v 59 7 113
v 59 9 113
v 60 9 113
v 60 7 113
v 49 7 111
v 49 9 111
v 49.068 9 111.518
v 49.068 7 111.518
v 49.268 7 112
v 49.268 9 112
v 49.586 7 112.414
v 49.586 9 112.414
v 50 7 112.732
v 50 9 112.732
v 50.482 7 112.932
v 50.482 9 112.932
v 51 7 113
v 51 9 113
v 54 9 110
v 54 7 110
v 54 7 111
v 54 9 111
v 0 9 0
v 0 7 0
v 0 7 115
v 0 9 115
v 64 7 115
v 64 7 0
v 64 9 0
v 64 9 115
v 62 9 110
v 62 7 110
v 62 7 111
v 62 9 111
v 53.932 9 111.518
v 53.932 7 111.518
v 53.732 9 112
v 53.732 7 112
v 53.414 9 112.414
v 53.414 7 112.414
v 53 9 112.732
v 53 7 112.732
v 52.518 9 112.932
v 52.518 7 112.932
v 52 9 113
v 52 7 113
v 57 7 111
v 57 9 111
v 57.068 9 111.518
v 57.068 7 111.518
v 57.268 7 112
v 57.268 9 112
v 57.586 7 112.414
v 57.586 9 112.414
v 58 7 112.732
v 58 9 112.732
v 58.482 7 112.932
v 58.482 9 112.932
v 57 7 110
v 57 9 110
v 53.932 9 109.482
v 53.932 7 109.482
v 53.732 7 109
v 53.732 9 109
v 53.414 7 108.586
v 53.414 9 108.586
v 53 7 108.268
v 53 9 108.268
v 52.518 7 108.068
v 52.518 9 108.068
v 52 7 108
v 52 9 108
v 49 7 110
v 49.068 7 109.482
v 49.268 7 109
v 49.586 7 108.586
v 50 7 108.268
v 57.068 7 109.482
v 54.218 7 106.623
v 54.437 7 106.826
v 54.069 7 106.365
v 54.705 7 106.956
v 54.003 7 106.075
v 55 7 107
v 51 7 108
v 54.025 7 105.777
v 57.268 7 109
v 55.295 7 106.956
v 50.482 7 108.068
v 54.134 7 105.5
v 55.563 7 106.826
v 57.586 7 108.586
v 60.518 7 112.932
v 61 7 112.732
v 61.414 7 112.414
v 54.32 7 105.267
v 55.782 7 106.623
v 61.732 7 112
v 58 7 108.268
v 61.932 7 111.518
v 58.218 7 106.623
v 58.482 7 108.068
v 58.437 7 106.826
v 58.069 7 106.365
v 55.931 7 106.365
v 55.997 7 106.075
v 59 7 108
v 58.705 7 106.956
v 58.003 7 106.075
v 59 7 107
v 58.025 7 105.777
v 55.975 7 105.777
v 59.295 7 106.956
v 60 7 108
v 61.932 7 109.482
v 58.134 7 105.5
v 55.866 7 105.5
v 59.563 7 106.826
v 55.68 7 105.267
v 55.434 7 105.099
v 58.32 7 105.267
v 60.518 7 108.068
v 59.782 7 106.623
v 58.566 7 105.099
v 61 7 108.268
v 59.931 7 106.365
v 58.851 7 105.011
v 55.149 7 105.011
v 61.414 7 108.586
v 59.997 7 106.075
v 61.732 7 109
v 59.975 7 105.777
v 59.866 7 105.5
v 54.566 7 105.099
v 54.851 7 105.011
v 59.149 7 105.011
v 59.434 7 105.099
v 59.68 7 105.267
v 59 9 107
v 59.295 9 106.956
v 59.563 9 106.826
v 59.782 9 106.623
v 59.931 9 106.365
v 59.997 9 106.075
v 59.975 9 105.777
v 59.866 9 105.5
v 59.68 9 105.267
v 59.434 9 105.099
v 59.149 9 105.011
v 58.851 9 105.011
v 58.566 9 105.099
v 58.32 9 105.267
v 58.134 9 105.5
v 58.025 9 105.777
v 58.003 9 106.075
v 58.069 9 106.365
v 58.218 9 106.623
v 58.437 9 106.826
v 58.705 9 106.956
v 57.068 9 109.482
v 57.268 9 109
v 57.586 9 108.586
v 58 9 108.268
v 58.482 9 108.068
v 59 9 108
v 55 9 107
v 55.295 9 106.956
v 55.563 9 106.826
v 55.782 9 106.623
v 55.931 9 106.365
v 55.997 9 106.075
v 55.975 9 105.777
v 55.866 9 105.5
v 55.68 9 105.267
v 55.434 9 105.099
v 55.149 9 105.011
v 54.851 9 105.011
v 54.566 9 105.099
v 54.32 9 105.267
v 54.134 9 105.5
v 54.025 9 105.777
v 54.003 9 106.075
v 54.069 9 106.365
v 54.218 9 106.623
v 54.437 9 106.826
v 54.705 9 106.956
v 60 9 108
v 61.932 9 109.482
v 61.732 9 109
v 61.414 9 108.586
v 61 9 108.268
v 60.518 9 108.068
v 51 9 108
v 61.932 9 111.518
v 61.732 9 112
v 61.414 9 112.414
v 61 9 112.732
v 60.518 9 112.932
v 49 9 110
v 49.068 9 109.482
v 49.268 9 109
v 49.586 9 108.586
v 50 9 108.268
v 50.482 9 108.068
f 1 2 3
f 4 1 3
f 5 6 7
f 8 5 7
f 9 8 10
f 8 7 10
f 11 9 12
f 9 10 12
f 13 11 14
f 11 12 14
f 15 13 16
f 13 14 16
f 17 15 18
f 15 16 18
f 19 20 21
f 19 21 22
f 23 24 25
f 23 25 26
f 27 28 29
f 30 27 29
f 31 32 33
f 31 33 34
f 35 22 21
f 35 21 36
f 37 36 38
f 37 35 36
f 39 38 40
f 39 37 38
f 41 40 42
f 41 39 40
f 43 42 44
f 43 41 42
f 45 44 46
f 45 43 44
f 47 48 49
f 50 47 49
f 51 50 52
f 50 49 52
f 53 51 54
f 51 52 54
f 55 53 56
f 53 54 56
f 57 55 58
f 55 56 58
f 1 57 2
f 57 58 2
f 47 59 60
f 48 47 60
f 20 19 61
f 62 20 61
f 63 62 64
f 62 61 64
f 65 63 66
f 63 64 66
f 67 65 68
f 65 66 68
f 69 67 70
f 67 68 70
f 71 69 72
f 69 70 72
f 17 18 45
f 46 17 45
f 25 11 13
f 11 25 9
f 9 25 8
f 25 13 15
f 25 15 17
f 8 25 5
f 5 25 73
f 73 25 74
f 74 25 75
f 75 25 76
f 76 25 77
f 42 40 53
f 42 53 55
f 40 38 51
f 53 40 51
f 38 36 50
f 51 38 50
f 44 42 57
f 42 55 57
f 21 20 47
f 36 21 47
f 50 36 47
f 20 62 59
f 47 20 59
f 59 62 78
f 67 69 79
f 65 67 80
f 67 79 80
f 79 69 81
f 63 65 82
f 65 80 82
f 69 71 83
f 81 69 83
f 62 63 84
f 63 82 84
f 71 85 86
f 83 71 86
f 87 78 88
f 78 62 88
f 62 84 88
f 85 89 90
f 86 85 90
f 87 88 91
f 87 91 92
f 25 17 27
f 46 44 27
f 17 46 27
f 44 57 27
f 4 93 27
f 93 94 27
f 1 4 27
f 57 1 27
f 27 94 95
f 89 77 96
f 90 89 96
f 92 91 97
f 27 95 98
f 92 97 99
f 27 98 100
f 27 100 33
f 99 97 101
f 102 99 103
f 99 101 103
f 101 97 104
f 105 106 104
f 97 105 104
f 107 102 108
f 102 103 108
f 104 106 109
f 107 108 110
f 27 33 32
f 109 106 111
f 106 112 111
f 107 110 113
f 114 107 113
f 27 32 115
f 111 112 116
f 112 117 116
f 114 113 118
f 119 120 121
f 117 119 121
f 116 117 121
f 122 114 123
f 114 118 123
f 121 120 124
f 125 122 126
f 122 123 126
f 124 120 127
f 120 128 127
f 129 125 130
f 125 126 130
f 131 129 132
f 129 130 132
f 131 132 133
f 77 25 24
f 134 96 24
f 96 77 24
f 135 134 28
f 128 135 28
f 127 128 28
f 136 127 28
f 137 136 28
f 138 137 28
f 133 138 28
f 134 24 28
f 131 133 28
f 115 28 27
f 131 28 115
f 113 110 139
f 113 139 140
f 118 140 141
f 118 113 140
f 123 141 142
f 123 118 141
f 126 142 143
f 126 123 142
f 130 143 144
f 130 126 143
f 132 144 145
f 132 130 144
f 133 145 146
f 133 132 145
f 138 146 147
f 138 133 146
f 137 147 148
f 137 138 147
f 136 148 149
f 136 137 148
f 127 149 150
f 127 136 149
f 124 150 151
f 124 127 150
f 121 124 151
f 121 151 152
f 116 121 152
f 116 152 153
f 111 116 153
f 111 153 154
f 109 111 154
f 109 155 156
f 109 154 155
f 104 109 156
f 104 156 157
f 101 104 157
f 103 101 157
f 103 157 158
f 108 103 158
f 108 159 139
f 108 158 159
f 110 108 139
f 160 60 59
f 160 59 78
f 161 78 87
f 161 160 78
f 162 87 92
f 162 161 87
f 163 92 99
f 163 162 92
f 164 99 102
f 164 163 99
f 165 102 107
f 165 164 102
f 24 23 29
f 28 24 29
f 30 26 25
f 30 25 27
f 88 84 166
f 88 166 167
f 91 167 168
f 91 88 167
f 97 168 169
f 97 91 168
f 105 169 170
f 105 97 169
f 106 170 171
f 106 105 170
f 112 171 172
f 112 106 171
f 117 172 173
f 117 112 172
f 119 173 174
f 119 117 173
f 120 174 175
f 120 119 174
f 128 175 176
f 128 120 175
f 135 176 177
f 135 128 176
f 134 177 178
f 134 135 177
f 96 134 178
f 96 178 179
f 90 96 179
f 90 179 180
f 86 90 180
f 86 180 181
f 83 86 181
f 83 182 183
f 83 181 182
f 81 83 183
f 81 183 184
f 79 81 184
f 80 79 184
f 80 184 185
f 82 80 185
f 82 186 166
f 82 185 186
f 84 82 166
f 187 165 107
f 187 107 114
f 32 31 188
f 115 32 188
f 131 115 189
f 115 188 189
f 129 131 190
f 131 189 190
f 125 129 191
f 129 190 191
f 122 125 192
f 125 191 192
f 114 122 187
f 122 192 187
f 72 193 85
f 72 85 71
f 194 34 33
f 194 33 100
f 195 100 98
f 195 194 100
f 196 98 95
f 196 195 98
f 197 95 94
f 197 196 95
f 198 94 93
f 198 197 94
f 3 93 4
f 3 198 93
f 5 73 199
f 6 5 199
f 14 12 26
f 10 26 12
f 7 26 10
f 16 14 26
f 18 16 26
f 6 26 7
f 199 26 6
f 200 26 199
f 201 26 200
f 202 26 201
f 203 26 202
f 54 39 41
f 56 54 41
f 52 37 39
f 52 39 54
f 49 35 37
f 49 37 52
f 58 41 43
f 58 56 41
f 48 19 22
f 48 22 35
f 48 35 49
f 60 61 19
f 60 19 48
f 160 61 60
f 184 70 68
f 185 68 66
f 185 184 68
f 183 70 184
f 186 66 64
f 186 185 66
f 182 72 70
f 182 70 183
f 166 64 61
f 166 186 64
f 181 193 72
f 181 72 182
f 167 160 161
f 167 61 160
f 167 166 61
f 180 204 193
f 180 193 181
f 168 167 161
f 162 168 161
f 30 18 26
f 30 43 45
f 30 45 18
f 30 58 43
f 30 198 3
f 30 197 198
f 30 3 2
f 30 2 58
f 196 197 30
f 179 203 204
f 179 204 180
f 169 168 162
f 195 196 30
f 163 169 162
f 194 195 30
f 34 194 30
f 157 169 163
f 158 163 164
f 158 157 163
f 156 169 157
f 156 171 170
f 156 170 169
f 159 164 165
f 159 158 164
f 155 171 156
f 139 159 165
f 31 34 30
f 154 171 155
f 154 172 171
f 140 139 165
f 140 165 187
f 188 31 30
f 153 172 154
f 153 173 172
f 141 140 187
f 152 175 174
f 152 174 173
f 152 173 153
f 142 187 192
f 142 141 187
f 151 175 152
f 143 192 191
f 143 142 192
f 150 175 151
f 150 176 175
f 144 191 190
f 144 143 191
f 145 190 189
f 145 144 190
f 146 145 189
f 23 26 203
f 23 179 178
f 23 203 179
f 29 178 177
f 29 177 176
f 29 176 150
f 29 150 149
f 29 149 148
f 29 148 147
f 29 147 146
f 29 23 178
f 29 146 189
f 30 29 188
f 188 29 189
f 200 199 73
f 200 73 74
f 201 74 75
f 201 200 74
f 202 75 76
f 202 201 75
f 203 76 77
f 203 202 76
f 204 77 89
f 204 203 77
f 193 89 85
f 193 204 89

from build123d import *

# Parameters (mm, degrees)
CYLINDER011_R     = 1
CYLINDER011_DEPTH = 10
CYLINDER012_R     = 1
CYLINDER012_DEPTH = 10
BOX014_W          = 5
BOX014_H          = 5
BOX014_DEPTH      = 5
FILLET005_R       = 2
BOX013_W          = 5
BOX013_H          = 5
BOX013_DEPTH      = 5
FILLET004_R       = 2
BOX016_W          = 64
BOX016_H          = 2
BOX016_DEPTH      = 115


with BuildPart() as cilindro011:
    # Cylinder011 → Cylinder011 (new body)
    with BuildSketch(Plane(origin=(59, 6, 106), x_dir=(0, 0, 1), z_dir=(0, 1, 0))):
        Circle(CYLINDER011_R)
    extrude(amount=CYLINDER011_DEPTH)


with BuildPart() as cilindro012:
    # Cylinder012 → Cylinder012 (new body)
    with BuildSketch(Plane(origin=(55, 6, 106), x_dir=(0, 0, 1), z_dir=(0, 1, 0))):
        Circle(CYLINDER012_R)
    extrude(amount=CYLINDER012_DEPTH)


with BuildPart() as fillet005:
    # Box014 → Box014 (new body)
    with BuildSketch(Plane(origin=(57, 6, 108), x_dir=(1, 0, 0), z_dir=(0, 0, 1))):
        with Locations((2.5, 2.5)):
            Rectangle(BOX014_W, BOX014_H)
    extrude(amount=BOX014_DEPTH)

    # Fillet005
    fillet005_edges = [fillet005.edges().sort_by_distance(p)[0] for p in [
        (57, 8.5, 113),
        (57, 8.5, 108),
        (62, 8.5, 113),
        (62, 8.5, 108),
    ]]
    fillet(fillet005_edges, radius=FILLET005_R)


with BuildPart() as fillet005_1:
    # Fillet005 placement: moved
    add(fillet005.part.moved(Location((-8, 0, 0))))


with BuildPart() as fillet004:
    # Box013 → Box013 (new body)
    with BuildSketch(Plane(origin=(57, 6, 108), x_dir=(1, 0, 0), z_dir=(0, 0, 1))):
        with Locations((2.5, 2.5)):
            Rectangle(BOX013_W, BOX013_H)
    extrude(amount=BOX013_DEPTH)

    # Fillet004
    fillet004_edges = [fillet004.edges().sort_by_distance(p)[0] for p in [
        (57, 8.5, 113),
        (57, 8.5, 108),
        (62, 8.5, 113),
        (62, 8.5, 108),
    ]]
    fillet(fillet004_edges, radius=FILLET004_R)


with BuildPart() as back:
    # Box016 → Box016 (new body)
    with BuildSketch(Plane(origin=(0, 7, 0), x_dir=(1, 0, 0), z_dir=(0, 0, 1))):
        with Locations((32, 1)):
            Rectangle(BOX016_W, BOX016_H)
    extrude(amount=BOX016_DEPTH)

    # Cut020: cut Fillet004
    add(fillet004.part, mode=Mode.SUBTRACT)

    # Cut021: cut Fillet005
    add(fillet005_1.part, mode=Mode.SUBTRACT)

    # Cut031: cut Cilindro012
    add(cilindro012.part, mode=Mode.SUBTRACT)

    # Cut032: cut Cilindro011
    add(cilindro011.part, mode=Mode.SUBTRACT)


solid = back.part
